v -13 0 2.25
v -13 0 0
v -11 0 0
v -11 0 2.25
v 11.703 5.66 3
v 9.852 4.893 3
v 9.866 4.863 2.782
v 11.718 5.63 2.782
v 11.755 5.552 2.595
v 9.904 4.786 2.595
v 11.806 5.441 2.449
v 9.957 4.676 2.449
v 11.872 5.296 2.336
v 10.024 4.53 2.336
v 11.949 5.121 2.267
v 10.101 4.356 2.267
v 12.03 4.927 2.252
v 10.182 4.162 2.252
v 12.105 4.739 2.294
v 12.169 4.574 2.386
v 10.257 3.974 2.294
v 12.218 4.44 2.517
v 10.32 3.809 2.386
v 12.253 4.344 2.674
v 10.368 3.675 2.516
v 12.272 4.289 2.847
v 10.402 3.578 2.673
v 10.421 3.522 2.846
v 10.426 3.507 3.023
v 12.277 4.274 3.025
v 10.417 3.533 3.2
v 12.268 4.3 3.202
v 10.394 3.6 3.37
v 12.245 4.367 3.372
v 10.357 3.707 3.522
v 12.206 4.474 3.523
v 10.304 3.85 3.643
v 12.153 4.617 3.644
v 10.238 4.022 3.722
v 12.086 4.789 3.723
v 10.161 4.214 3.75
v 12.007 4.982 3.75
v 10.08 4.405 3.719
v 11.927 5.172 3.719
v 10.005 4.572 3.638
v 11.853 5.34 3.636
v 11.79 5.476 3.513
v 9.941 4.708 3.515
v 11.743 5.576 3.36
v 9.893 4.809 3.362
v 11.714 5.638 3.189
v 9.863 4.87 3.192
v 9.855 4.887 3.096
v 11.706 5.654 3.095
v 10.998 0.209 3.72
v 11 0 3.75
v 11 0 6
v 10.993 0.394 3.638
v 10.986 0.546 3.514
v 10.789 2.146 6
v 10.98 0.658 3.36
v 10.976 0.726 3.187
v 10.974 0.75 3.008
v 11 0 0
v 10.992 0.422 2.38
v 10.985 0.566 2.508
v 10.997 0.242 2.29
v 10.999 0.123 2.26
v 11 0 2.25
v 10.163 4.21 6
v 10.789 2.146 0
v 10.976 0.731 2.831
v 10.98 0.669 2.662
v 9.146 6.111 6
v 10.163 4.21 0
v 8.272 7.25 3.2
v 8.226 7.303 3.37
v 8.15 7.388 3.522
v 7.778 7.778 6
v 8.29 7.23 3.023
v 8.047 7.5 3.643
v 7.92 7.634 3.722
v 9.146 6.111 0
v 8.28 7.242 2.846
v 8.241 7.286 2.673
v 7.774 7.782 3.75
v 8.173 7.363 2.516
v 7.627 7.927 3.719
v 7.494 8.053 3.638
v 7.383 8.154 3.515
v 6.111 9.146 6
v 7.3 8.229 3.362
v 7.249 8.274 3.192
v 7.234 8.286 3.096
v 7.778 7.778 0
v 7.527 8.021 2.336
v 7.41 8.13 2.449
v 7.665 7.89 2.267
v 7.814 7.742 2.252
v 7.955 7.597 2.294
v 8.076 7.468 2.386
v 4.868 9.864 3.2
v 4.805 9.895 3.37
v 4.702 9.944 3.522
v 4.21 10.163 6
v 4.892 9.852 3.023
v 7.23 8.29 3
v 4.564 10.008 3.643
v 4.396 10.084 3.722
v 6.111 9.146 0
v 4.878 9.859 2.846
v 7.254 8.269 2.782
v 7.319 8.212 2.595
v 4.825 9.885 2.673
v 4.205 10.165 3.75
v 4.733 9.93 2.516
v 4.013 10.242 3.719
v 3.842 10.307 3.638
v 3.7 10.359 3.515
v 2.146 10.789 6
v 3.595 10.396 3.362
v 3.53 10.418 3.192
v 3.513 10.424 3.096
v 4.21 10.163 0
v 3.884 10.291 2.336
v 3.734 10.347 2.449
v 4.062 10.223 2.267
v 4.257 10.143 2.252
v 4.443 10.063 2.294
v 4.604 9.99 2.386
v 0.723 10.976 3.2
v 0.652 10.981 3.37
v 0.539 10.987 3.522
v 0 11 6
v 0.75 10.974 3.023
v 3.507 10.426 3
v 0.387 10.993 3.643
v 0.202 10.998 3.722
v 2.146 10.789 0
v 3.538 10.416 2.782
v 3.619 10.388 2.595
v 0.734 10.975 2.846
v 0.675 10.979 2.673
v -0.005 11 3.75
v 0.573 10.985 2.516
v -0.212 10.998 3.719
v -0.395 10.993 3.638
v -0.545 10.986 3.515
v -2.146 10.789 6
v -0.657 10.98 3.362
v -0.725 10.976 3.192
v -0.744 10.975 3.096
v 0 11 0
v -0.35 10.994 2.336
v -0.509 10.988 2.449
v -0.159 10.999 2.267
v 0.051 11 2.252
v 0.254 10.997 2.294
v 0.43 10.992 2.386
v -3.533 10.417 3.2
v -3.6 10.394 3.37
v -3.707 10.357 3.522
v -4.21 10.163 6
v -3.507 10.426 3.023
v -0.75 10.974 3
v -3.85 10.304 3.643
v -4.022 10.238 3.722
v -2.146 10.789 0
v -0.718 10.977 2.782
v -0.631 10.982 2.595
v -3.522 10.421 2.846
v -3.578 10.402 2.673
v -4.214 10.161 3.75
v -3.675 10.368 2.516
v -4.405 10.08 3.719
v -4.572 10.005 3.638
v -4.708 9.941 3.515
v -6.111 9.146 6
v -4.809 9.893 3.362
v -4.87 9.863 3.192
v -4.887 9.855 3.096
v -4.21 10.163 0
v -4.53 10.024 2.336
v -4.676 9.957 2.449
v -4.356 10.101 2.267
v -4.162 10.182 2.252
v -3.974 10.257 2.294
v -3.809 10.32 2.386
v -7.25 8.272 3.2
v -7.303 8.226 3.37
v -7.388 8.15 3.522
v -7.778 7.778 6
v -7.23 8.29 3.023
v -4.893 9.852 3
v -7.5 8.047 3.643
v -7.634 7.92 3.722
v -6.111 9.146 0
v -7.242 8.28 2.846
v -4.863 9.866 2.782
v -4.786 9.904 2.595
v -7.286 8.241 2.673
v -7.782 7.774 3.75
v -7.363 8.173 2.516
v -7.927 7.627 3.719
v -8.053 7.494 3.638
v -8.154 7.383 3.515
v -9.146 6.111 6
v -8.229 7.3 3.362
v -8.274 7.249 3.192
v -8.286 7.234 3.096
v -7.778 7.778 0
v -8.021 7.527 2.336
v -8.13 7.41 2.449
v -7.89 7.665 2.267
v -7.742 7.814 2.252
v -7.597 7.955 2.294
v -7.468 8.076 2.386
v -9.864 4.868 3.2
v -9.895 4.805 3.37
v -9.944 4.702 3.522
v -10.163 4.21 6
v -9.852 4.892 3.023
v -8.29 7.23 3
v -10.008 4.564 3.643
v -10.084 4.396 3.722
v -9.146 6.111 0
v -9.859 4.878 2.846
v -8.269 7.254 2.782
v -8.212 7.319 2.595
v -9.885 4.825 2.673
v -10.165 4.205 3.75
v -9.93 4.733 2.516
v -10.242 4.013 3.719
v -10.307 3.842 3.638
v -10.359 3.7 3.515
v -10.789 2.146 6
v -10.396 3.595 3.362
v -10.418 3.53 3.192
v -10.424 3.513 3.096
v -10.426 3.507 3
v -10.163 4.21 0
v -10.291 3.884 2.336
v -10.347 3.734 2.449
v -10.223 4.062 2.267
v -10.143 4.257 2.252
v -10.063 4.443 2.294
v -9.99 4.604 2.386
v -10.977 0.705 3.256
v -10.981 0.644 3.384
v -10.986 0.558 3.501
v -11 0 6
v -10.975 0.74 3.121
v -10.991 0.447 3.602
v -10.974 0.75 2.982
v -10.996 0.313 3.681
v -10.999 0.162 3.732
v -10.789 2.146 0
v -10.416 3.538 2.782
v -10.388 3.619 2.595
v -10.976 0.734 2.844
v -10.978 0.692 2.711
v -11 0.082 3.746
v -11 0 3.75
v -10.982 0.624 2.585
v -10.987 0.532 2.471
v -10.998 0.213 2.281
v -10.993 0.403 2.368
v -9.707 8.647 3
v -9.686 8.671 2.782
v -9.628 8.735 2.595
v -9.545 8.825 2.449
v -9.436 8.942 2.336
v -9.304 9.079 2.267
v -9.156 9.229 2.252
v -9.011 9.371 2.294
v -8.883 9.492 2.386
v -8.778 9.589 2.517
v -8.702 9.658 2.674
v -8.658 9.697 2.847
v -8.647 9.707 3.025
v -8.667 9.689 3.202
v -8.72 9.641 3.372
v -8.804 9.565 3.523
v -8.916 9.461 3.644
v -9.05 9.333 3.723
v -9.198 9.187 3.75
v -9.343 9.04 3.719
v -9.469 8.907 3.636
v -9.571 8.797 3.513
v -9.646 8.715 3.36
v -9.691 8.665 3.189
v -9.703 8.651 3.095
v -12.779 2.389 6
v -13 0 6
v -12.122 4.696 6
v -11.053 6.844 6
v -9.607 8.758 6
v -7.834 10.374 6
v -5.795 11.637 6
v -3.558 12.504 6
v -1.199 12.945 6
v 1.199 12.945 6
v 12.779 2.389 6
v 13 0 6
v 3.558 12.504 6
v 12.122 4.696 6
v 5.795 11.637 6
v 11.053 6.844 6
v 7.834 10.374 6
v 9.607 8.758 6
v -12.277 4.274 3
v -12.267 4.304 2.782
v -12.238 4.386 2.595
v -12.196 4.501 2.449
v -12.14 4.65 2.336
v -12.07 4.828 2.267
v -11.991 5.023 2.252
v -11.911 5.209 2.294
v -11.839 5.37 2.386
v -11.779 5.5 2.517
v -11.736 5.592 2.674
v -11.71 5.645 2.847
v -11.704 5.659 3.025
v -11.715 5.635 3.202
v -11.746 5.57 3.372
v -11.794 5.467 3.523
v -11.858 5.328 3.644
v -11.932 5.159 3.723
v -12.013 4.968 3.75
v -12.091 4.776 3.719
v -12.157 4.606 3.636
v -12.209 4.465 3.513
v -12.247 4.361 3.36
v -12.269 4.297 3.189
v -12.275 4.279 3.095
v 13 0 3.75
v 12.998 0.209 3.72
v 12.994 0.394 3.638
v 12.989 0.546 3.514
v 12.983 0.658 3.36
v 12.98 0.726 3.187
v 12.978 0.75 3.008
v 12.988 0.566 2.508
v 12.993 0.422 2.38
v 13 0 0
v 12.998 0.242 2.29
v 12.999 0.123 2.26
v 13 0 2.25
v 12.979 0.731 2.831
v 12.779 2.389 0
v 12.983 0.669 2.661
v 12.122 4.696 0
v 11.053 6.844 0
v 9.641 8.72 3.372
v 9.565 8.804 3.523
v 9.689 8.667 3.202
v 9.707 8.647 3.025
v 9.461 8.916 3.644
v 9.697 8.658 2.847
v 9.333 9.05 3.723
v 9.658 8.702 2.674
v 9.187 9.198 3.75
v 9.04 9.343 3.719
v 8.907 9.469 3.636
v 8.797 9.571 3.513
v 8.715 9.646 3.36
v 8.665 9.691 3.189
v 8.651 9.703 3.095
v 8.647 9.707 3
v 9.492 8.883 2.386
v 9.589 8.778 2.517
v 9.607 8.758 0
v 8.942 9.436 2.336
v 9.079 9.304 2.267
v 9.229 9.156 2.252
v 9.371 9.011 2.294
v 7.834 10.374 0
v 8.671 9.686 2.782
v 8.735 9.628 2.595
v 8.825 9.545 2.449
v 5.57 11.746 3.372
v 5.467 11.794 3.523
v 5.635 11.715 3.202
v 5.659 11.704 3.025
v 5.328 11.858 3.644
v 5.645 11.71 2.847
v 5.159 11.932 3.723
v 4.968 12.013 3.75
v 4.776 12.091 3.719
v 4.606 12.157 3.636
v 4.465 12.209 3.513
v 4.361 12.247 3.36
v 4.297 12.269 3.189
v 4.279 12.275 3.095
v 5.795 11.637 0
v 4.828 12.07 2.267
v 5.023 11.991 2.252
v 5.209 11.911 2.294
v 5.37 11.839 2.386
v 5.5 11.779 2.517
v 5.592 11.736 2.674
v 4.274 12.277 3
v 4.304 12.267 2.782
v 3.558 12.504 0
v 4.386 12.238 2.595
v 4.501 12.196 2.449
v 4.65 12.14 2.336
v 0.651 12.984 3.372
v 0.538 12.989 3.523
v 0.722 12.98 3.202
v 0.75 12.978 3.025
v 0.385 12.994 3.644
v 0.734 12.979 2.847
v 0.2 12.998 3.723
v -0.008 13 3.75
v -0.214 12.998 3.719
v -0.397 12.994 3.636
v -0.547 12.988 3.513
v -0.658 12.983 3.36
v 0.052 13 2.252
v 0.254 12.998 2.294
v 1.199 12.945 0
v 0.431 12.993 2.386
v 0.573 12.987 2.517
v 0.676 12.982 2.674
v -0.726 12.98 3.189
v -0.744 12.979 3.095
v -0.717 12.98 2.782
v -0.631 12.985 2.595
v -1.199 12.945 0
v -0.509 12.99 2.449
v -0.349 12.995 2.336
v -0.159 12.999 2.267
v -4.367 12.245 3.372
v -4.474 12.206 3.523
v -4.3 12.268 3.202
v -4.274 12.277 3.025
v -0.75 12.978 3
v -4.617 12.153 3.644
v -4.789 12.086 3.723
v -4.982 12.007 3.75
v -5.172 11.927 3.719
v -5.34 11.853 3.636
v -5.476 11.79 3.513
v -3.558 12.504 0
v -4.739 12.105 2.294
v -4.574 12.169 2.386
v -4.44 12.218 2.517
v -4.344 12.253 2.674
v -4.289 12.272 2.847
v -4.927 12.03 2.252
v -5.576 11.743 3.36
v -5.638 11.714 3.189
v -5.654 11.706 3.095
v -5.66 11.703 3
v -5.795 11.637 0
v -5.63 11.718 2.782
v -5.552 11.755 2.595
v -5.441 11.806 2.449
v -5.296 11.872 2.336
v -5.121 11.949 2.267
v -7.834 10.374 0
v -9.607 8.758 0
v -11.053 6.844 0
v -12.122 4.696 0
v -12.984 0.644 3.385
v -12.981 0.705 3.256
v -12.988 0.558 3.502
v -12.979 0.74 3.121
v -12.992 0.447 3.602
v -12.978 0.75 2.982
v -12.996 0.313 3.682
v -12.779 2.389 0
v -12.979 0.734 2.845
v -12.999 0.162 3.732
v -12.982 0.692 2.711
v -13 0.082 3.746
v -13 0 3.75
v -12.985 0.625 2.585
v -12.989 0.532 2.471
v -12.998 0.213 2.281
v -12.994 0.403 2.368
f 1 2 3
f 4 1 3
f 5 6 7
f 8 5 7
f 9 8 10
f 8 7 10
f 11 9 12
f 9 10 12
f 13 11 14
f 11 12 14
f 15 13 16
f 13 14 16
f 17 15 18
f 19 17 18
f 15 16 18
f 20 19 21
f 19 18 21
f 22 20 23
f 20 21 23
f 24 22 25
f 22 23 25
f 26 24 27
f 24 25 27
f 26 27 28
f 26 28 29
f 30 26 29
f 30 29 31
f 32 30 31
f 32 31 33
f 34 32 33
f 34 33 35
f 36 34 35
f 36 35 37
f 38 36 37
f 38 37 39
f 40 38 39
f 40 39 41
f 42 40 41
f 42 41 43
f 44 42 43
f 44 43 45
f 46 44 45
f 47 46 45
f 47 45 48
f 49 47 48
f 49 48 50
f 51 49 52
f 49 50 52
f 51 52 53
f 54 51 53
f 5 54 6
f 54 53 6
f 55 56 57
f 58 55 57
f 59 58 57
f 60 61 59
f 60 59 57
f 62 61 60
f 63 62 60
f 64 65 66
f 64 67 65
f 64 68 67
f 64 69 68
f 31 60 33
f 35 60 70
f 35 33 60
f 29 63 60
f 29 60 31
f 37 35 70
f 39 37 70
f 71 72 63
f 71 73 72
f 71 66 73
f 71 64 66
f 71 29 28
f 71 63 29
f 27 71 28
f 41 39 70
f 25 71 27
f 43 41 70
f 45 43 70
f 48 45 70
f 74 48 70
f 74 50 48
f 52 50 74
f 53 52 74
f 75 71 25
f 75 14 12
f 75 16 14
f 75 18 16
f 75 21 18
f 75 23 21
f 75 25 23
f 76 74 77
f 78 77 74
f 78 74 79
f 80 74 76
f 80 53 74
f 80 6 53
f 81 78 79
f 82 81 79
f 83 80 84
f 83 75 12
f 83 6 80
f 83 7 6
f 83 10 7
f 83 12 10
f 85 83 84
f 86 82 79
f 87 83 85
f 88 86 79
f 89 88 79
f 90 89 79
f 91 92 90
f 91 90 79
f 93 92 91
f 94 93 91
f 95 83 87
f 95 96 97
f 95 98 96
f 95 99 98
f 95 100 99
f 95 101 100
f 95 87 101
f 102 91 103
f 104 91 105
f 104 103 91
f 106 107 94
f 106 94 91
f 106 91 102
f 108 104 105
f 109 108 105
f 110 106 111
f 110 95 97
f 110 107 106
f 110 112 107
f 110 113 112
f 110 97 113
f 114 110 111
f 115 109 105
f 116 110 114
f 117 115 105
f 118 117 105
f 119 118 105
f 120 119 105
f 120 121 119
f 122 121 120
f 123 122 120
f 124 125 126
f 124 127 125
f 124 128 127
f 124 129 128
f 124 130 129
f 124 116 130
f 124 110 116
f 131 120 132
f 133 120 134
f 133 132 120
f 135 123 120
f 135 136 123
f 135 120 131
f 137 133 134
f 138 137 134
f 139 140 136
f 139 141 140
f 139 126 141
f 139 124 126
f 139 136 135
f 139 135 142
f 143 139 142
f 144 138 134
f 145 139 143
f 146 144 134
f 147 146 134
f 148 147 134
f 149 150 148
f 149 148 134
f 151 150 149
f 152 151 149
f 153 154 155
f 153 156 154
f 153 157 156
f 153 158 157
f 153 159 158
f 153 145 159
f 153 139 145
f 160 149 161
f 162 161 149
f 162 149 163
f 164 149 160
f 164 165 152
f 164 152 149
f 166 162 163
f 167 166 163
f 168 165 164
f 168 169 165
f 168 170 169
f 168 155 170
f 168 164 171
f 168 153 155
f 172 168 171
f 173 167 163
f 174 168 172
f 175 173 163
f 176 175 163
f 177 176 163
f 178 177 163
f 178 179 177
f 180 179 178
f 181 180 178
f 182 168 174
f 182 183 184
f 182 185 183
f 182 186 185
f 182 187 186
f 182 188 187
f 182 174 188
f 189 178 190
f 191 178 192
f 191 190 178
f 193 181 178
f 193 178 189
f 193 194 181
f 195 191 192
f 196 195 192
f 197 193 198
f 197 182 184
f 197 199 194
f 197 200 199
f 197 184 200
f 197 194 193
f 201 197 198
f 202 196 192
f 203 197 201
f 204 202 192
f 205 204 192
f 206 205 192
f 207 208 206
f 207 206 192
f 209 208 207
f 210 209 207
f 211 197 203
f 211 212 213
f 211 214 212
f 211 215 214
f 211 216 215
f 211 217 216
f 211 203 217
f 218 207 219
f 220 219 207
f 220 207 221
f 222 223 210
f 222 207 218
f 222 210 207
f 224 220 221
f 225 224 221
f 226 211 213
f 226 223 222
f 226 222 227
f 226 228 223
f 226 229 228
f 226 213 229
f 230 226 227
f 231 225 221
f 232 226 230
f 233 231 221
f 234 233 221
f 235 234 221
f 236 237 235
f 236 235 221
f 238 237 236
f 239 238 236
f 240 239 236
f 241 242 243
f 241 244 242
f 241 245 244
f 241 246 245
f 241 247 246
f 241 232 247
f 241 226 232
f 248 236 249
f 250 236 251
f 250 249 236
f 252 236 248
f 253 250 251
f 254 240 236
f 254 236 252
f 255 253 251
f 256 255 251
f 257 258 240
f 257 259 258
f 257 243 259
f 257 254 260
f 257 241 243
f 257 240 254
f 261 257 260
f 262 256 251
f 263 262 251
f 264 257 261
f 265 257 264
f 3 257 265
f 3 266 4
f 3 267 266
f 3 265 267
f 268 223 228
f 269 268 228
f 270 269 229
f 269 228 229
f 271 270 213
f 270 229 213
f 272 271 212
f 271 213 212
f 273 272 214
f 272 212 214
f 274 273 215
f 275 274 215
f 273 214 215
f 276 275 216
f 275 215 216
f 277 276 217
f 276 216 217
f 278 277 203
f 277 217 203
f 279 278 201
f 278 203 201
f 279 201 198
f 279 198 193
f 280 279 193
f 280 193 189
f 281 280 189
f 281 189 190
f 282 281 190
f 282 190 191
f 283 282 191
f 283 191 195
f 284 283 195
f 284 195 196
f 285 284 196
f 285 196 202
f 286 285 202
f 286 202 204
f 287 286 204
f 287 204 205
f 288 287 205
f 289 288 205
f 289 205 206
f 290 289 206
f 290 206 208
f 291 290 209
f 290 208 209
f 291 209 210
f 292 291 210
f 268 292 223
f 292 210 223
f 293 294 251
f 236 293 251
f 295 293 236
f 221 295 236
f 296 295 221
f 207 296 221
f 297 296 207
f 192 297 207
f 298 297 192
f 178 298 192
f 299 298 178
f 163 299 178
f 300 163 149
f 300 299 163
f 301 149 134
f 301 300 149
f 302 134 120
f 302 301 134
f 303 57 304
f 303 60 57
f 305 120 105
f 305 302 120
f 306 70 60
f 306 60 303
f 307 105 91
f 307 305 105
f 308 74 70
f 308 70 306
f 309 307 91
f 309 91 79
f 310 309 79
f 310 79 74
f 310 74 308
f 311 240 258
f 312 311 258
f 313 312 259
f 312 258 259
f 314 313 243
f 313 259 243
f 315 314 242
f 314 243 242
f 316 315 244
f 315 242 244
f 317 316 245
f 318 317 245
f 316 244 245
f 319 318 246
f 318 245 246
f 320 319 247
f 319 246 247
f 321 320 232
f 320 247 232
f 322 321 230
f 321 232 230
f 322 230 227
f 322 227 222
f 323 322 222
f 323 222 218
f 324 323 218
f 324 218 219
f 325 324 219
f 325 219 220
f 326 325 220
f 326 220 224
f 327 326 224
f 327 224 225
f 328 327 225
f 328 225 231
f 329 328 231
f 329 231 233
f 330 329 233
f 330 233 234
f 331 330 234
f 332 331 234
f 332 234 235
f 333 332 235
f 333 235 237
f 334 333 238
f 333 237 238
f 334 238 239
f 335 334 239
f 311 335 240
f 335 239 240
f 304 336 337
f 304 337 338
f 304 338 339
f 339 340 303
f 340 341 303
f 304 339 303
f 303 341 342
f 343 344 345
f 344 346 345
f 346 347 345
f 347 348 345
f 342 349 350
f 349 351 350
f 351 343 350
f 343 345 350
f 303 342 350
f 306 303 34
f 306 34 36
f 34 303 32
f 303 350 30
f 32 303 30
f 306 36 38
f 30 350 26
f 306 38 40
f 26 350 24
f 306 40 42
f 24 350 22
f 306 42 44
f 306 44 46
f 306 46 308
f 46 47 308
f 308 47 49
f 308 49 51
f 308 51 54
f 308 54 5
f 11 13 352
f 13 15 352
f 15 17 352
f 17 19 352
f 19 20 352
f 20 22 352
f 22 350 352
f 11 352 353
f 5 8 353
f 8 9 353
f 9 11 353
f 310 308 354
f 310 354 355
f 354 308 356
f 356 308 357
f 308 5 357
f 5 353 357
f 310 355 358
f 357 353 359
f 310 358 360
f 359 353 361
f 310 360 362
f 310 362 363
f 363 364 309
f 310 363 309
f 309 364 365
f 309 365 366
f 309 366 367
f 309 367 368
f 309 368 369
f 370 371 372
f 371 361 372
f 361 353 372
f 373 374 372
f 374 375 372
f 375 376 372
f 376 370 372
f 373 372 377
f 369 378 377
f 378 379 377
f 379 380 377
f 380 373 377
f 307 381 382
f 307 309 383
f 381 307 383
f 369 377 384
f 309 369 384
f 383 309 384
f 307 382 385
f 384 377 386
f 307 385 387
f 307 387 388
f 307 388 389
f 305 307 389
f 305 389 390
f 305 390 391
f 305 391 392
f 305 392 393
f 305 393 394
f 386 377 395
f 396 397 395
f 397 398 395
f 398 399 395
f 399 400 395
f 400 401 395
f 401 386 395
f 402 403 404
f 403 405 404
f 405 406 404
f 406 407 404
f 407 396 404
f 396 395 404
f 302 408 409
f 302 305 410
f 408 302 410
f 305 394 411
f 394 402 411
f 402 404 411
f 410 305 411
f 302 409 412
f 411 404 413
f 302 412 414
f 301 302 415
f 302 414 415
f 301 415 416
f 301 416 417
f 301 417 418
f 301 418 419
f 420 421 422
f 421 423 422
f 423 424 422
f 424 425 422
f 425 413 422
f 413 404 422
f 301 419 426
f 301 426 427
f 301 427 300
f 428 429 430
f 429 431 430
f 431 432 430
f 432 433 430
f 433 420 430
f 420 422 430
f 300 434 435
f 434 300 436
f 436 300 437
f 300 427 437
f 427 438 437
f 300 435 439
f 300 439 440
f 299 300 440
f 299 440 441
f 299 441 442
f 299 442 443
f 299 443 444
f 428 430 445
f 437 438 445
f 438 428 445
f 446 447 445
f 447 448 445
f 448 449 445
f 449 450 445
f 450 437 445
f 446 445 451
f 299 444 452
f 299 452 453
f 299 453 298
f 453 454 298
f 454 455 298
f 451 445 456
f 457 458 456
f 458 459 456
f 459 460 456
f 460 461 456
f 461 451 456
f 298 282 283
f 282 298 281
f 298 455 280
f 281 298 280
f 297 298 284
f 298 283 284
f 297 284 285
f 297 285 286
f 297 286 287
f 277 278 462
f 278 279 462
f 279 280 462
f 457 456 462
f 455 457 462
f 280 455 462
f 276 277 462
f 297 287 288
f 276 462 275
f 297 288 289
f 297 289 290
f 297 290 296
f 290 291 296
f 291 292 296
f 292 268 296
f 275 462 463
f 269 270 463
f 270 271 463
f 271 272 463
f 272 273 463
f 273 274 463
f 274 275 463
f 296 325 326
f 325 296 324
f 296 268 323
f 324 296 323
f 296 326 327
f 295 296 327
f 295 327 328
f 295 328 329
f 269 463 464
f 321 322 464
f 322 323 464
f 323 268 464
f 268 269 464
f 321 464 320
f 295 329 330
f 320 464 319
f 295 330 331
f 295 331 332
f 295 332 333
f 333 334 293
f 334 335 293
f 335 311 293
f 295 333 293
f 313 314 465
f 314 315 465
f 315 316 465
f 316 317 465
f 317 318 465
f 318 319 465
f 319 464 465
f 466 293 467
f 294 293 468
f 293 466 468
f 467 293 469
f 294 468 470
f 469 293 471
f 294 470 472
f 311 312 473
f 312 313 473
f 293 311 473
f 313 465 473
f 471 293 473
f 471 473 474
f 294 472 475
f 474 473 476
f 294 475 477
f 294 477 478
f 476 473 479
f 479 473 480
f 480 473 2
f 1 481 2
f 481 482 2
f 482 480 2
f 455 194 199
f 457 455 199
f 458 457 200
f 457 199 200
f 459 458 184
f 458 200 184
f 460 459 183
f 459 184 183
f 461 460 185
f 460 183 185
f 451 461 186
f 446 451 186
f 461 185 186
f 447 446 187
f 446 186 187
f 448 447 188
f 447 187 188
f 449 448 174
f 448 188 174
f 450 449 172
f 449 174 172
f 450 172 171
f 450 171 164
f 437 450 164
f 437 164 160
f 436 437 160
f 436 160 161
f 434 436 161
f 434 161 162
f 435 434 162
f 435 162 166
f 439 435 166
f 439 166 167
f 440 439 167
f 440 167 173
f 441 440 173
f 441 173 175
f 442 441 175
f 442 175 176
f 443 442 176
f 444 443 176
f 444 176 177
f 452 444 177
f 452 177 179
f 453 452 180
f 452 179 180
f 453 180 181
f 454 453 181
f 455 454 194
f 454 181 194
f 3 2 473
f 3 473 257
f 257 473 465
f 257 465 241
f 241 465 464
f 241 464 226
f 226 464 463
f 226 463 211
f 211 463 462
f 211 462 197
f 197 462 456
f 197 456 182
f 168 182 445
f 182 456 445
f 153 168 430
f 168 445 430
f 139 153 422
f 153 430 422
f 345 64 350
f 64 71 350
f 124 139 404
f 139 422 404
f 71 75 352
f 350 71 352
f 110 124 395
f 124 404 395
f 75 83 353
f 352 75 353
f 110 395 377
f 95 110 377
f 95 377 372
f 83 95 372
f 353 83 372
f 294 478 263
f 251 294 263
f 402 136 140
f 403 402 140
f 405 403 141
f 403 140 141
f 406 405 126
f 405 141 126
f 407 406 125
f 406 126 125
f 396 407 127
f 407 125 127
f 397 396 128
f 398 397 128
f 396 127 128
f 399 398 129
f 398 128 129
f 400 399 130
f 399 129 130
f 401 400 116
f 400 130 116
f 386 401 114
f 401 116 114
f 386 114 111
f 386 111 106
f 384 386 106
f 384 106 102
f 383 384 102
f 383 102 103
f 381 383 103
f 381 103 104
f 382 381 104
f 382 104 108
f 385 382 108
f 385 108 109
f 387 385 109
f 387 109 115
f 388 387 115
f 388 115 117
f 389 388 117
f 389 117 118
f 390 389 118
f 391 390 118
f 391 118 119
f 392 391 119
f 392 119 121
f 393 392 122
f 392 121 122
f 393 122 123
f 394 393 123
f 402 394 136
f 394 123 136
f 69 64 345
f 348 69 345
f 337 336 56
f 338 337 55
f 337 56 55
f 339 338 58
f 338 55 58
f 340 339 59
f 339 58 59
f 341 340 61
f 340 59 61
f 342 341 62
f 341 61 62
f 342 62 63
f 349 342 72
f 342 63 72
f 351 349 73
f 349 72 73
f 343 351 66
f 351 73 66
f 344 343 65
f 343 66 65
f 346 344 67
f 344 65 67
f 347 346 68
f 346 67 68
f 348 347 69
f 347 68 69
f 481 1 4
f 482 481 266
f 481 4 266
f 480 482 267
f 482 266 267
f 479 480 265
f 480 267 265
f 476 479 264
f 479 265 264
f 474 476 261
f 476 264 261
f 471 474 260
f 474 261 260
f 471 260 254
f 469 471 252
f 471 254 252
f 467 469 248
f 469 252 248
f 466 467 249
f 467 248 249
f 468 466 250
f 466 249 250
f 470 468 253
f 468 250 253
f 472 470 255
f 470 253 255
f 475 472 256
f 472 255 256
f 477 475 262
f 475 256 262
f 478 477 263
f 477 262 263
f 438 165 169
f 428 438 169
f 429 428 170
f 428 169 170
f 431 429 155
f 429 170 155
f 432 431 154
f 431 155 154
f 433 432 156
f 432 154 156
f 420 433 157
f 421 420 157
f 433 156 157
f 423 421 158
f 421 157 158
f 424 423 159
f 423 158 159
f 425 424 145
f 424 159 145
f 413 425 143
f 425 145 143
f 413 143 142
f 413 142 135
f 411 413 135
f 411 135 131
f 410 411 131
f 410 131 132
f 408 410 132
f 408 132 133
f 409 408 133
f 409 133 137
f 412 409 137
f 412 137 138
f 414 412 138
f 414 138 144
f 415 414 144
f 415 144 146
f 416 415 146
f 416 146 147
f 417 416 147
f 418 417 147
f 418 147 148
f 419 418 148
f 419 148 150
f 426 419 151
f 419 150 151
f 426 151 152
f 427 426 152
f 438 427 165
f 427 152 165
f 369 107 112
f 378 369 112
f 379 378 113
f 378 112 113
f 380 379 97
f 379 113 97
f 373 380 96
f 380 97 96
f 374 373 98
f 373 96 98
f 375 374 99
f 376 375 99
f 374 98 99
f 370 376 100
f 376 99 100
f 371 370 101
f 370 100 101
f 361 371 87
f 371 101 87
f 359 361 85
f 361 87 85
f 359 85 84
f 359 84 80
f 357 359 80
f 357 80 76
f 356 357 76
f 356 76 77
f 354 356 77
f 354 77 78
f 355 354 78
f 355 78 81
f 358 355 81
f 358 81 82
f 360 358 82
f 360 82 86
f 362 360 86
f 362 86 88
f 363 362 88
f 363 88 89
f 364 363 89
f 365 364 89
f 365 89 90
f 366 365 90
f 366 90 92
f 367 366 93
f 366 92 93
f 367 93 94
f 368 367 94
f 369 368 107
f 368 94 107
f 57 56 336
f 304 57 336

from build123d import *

# Parameters (mm, degrees)
SKETCH_1_R               = 13
SKETCH_1_R_2             = 11
EXTRUDE_1_DEPTH          = 6
SKETCH_2_R               = 0.75
CUT_EXTRUDE_1_DEPTH      = 14
PATTERN_CIRCULAR_1_COUNT = 16
SKETCH_3_W               = 36.79853237
SKETCH_3_H               = 11.94610836
CUT_EXTRUDE_2_DEPTH      = 14.0000001


with BuildPart() as part:
    # ｽｹｯﾁ1 → ﾎﾞｽ - 押し出し1 (new body)
    with BuildSketch(Plane.XY):
        Circle(SKETCH_1_R)
        Circle(SKETCH_1_R_2, mode=Mode.SUBTRACT)
    extrude(amount=EXTRUDE_1_DEPTH)

    # ｽｹｯﾁ2 → ｶｯﾄ - 押し出し1 (cut, through all)
    with BuildSketch(Plane(origin=(0, 0, 0), x_dir=(1, 0, 0), z_dir=(0, 1, 0))):
        with Locations((0, -3)):
            Circle(SKETCH_2_R)
    cut_extrude_1 = extrude(amount=-CUT_EXTRUDE_1_DEPTH, mode=Mode.SUBTRACT)

    # 円形ﾊﾟﾀｰﾝ1: ｶｯﾄ - 押し出し1 ×16 about axis
    pattern_circular_1_axis = Axis((0, 0, 0), (0, 0, 1))
    for i in range(1, PATTERN_CIRCULAR_1_COUNT):
        add(cut_extrude_1.rotate(pattern_circular_1_axis, i * 360 / PATTERN_CIRCULAR_1_COUNT), mode=Mode.SUBTRACT)

    # ｽｹｯﾁ3 → ｶｯﾄ - 押し出し2 (cut, through all)
    with BuildSketch(Plane(origin=(0, 0, 0), x_dir=(1, 0, 0), z_dir=(0, 1, 0))):
        with Locations((0, -2.028241391)):
            Rectangle(SKETCH_3_W, SKETCH_3_H)
    extrude(amount=-CUT_EXTRUDE_2_DEPTH, mode=Mode.SUBTRACT)


solid = part.part
